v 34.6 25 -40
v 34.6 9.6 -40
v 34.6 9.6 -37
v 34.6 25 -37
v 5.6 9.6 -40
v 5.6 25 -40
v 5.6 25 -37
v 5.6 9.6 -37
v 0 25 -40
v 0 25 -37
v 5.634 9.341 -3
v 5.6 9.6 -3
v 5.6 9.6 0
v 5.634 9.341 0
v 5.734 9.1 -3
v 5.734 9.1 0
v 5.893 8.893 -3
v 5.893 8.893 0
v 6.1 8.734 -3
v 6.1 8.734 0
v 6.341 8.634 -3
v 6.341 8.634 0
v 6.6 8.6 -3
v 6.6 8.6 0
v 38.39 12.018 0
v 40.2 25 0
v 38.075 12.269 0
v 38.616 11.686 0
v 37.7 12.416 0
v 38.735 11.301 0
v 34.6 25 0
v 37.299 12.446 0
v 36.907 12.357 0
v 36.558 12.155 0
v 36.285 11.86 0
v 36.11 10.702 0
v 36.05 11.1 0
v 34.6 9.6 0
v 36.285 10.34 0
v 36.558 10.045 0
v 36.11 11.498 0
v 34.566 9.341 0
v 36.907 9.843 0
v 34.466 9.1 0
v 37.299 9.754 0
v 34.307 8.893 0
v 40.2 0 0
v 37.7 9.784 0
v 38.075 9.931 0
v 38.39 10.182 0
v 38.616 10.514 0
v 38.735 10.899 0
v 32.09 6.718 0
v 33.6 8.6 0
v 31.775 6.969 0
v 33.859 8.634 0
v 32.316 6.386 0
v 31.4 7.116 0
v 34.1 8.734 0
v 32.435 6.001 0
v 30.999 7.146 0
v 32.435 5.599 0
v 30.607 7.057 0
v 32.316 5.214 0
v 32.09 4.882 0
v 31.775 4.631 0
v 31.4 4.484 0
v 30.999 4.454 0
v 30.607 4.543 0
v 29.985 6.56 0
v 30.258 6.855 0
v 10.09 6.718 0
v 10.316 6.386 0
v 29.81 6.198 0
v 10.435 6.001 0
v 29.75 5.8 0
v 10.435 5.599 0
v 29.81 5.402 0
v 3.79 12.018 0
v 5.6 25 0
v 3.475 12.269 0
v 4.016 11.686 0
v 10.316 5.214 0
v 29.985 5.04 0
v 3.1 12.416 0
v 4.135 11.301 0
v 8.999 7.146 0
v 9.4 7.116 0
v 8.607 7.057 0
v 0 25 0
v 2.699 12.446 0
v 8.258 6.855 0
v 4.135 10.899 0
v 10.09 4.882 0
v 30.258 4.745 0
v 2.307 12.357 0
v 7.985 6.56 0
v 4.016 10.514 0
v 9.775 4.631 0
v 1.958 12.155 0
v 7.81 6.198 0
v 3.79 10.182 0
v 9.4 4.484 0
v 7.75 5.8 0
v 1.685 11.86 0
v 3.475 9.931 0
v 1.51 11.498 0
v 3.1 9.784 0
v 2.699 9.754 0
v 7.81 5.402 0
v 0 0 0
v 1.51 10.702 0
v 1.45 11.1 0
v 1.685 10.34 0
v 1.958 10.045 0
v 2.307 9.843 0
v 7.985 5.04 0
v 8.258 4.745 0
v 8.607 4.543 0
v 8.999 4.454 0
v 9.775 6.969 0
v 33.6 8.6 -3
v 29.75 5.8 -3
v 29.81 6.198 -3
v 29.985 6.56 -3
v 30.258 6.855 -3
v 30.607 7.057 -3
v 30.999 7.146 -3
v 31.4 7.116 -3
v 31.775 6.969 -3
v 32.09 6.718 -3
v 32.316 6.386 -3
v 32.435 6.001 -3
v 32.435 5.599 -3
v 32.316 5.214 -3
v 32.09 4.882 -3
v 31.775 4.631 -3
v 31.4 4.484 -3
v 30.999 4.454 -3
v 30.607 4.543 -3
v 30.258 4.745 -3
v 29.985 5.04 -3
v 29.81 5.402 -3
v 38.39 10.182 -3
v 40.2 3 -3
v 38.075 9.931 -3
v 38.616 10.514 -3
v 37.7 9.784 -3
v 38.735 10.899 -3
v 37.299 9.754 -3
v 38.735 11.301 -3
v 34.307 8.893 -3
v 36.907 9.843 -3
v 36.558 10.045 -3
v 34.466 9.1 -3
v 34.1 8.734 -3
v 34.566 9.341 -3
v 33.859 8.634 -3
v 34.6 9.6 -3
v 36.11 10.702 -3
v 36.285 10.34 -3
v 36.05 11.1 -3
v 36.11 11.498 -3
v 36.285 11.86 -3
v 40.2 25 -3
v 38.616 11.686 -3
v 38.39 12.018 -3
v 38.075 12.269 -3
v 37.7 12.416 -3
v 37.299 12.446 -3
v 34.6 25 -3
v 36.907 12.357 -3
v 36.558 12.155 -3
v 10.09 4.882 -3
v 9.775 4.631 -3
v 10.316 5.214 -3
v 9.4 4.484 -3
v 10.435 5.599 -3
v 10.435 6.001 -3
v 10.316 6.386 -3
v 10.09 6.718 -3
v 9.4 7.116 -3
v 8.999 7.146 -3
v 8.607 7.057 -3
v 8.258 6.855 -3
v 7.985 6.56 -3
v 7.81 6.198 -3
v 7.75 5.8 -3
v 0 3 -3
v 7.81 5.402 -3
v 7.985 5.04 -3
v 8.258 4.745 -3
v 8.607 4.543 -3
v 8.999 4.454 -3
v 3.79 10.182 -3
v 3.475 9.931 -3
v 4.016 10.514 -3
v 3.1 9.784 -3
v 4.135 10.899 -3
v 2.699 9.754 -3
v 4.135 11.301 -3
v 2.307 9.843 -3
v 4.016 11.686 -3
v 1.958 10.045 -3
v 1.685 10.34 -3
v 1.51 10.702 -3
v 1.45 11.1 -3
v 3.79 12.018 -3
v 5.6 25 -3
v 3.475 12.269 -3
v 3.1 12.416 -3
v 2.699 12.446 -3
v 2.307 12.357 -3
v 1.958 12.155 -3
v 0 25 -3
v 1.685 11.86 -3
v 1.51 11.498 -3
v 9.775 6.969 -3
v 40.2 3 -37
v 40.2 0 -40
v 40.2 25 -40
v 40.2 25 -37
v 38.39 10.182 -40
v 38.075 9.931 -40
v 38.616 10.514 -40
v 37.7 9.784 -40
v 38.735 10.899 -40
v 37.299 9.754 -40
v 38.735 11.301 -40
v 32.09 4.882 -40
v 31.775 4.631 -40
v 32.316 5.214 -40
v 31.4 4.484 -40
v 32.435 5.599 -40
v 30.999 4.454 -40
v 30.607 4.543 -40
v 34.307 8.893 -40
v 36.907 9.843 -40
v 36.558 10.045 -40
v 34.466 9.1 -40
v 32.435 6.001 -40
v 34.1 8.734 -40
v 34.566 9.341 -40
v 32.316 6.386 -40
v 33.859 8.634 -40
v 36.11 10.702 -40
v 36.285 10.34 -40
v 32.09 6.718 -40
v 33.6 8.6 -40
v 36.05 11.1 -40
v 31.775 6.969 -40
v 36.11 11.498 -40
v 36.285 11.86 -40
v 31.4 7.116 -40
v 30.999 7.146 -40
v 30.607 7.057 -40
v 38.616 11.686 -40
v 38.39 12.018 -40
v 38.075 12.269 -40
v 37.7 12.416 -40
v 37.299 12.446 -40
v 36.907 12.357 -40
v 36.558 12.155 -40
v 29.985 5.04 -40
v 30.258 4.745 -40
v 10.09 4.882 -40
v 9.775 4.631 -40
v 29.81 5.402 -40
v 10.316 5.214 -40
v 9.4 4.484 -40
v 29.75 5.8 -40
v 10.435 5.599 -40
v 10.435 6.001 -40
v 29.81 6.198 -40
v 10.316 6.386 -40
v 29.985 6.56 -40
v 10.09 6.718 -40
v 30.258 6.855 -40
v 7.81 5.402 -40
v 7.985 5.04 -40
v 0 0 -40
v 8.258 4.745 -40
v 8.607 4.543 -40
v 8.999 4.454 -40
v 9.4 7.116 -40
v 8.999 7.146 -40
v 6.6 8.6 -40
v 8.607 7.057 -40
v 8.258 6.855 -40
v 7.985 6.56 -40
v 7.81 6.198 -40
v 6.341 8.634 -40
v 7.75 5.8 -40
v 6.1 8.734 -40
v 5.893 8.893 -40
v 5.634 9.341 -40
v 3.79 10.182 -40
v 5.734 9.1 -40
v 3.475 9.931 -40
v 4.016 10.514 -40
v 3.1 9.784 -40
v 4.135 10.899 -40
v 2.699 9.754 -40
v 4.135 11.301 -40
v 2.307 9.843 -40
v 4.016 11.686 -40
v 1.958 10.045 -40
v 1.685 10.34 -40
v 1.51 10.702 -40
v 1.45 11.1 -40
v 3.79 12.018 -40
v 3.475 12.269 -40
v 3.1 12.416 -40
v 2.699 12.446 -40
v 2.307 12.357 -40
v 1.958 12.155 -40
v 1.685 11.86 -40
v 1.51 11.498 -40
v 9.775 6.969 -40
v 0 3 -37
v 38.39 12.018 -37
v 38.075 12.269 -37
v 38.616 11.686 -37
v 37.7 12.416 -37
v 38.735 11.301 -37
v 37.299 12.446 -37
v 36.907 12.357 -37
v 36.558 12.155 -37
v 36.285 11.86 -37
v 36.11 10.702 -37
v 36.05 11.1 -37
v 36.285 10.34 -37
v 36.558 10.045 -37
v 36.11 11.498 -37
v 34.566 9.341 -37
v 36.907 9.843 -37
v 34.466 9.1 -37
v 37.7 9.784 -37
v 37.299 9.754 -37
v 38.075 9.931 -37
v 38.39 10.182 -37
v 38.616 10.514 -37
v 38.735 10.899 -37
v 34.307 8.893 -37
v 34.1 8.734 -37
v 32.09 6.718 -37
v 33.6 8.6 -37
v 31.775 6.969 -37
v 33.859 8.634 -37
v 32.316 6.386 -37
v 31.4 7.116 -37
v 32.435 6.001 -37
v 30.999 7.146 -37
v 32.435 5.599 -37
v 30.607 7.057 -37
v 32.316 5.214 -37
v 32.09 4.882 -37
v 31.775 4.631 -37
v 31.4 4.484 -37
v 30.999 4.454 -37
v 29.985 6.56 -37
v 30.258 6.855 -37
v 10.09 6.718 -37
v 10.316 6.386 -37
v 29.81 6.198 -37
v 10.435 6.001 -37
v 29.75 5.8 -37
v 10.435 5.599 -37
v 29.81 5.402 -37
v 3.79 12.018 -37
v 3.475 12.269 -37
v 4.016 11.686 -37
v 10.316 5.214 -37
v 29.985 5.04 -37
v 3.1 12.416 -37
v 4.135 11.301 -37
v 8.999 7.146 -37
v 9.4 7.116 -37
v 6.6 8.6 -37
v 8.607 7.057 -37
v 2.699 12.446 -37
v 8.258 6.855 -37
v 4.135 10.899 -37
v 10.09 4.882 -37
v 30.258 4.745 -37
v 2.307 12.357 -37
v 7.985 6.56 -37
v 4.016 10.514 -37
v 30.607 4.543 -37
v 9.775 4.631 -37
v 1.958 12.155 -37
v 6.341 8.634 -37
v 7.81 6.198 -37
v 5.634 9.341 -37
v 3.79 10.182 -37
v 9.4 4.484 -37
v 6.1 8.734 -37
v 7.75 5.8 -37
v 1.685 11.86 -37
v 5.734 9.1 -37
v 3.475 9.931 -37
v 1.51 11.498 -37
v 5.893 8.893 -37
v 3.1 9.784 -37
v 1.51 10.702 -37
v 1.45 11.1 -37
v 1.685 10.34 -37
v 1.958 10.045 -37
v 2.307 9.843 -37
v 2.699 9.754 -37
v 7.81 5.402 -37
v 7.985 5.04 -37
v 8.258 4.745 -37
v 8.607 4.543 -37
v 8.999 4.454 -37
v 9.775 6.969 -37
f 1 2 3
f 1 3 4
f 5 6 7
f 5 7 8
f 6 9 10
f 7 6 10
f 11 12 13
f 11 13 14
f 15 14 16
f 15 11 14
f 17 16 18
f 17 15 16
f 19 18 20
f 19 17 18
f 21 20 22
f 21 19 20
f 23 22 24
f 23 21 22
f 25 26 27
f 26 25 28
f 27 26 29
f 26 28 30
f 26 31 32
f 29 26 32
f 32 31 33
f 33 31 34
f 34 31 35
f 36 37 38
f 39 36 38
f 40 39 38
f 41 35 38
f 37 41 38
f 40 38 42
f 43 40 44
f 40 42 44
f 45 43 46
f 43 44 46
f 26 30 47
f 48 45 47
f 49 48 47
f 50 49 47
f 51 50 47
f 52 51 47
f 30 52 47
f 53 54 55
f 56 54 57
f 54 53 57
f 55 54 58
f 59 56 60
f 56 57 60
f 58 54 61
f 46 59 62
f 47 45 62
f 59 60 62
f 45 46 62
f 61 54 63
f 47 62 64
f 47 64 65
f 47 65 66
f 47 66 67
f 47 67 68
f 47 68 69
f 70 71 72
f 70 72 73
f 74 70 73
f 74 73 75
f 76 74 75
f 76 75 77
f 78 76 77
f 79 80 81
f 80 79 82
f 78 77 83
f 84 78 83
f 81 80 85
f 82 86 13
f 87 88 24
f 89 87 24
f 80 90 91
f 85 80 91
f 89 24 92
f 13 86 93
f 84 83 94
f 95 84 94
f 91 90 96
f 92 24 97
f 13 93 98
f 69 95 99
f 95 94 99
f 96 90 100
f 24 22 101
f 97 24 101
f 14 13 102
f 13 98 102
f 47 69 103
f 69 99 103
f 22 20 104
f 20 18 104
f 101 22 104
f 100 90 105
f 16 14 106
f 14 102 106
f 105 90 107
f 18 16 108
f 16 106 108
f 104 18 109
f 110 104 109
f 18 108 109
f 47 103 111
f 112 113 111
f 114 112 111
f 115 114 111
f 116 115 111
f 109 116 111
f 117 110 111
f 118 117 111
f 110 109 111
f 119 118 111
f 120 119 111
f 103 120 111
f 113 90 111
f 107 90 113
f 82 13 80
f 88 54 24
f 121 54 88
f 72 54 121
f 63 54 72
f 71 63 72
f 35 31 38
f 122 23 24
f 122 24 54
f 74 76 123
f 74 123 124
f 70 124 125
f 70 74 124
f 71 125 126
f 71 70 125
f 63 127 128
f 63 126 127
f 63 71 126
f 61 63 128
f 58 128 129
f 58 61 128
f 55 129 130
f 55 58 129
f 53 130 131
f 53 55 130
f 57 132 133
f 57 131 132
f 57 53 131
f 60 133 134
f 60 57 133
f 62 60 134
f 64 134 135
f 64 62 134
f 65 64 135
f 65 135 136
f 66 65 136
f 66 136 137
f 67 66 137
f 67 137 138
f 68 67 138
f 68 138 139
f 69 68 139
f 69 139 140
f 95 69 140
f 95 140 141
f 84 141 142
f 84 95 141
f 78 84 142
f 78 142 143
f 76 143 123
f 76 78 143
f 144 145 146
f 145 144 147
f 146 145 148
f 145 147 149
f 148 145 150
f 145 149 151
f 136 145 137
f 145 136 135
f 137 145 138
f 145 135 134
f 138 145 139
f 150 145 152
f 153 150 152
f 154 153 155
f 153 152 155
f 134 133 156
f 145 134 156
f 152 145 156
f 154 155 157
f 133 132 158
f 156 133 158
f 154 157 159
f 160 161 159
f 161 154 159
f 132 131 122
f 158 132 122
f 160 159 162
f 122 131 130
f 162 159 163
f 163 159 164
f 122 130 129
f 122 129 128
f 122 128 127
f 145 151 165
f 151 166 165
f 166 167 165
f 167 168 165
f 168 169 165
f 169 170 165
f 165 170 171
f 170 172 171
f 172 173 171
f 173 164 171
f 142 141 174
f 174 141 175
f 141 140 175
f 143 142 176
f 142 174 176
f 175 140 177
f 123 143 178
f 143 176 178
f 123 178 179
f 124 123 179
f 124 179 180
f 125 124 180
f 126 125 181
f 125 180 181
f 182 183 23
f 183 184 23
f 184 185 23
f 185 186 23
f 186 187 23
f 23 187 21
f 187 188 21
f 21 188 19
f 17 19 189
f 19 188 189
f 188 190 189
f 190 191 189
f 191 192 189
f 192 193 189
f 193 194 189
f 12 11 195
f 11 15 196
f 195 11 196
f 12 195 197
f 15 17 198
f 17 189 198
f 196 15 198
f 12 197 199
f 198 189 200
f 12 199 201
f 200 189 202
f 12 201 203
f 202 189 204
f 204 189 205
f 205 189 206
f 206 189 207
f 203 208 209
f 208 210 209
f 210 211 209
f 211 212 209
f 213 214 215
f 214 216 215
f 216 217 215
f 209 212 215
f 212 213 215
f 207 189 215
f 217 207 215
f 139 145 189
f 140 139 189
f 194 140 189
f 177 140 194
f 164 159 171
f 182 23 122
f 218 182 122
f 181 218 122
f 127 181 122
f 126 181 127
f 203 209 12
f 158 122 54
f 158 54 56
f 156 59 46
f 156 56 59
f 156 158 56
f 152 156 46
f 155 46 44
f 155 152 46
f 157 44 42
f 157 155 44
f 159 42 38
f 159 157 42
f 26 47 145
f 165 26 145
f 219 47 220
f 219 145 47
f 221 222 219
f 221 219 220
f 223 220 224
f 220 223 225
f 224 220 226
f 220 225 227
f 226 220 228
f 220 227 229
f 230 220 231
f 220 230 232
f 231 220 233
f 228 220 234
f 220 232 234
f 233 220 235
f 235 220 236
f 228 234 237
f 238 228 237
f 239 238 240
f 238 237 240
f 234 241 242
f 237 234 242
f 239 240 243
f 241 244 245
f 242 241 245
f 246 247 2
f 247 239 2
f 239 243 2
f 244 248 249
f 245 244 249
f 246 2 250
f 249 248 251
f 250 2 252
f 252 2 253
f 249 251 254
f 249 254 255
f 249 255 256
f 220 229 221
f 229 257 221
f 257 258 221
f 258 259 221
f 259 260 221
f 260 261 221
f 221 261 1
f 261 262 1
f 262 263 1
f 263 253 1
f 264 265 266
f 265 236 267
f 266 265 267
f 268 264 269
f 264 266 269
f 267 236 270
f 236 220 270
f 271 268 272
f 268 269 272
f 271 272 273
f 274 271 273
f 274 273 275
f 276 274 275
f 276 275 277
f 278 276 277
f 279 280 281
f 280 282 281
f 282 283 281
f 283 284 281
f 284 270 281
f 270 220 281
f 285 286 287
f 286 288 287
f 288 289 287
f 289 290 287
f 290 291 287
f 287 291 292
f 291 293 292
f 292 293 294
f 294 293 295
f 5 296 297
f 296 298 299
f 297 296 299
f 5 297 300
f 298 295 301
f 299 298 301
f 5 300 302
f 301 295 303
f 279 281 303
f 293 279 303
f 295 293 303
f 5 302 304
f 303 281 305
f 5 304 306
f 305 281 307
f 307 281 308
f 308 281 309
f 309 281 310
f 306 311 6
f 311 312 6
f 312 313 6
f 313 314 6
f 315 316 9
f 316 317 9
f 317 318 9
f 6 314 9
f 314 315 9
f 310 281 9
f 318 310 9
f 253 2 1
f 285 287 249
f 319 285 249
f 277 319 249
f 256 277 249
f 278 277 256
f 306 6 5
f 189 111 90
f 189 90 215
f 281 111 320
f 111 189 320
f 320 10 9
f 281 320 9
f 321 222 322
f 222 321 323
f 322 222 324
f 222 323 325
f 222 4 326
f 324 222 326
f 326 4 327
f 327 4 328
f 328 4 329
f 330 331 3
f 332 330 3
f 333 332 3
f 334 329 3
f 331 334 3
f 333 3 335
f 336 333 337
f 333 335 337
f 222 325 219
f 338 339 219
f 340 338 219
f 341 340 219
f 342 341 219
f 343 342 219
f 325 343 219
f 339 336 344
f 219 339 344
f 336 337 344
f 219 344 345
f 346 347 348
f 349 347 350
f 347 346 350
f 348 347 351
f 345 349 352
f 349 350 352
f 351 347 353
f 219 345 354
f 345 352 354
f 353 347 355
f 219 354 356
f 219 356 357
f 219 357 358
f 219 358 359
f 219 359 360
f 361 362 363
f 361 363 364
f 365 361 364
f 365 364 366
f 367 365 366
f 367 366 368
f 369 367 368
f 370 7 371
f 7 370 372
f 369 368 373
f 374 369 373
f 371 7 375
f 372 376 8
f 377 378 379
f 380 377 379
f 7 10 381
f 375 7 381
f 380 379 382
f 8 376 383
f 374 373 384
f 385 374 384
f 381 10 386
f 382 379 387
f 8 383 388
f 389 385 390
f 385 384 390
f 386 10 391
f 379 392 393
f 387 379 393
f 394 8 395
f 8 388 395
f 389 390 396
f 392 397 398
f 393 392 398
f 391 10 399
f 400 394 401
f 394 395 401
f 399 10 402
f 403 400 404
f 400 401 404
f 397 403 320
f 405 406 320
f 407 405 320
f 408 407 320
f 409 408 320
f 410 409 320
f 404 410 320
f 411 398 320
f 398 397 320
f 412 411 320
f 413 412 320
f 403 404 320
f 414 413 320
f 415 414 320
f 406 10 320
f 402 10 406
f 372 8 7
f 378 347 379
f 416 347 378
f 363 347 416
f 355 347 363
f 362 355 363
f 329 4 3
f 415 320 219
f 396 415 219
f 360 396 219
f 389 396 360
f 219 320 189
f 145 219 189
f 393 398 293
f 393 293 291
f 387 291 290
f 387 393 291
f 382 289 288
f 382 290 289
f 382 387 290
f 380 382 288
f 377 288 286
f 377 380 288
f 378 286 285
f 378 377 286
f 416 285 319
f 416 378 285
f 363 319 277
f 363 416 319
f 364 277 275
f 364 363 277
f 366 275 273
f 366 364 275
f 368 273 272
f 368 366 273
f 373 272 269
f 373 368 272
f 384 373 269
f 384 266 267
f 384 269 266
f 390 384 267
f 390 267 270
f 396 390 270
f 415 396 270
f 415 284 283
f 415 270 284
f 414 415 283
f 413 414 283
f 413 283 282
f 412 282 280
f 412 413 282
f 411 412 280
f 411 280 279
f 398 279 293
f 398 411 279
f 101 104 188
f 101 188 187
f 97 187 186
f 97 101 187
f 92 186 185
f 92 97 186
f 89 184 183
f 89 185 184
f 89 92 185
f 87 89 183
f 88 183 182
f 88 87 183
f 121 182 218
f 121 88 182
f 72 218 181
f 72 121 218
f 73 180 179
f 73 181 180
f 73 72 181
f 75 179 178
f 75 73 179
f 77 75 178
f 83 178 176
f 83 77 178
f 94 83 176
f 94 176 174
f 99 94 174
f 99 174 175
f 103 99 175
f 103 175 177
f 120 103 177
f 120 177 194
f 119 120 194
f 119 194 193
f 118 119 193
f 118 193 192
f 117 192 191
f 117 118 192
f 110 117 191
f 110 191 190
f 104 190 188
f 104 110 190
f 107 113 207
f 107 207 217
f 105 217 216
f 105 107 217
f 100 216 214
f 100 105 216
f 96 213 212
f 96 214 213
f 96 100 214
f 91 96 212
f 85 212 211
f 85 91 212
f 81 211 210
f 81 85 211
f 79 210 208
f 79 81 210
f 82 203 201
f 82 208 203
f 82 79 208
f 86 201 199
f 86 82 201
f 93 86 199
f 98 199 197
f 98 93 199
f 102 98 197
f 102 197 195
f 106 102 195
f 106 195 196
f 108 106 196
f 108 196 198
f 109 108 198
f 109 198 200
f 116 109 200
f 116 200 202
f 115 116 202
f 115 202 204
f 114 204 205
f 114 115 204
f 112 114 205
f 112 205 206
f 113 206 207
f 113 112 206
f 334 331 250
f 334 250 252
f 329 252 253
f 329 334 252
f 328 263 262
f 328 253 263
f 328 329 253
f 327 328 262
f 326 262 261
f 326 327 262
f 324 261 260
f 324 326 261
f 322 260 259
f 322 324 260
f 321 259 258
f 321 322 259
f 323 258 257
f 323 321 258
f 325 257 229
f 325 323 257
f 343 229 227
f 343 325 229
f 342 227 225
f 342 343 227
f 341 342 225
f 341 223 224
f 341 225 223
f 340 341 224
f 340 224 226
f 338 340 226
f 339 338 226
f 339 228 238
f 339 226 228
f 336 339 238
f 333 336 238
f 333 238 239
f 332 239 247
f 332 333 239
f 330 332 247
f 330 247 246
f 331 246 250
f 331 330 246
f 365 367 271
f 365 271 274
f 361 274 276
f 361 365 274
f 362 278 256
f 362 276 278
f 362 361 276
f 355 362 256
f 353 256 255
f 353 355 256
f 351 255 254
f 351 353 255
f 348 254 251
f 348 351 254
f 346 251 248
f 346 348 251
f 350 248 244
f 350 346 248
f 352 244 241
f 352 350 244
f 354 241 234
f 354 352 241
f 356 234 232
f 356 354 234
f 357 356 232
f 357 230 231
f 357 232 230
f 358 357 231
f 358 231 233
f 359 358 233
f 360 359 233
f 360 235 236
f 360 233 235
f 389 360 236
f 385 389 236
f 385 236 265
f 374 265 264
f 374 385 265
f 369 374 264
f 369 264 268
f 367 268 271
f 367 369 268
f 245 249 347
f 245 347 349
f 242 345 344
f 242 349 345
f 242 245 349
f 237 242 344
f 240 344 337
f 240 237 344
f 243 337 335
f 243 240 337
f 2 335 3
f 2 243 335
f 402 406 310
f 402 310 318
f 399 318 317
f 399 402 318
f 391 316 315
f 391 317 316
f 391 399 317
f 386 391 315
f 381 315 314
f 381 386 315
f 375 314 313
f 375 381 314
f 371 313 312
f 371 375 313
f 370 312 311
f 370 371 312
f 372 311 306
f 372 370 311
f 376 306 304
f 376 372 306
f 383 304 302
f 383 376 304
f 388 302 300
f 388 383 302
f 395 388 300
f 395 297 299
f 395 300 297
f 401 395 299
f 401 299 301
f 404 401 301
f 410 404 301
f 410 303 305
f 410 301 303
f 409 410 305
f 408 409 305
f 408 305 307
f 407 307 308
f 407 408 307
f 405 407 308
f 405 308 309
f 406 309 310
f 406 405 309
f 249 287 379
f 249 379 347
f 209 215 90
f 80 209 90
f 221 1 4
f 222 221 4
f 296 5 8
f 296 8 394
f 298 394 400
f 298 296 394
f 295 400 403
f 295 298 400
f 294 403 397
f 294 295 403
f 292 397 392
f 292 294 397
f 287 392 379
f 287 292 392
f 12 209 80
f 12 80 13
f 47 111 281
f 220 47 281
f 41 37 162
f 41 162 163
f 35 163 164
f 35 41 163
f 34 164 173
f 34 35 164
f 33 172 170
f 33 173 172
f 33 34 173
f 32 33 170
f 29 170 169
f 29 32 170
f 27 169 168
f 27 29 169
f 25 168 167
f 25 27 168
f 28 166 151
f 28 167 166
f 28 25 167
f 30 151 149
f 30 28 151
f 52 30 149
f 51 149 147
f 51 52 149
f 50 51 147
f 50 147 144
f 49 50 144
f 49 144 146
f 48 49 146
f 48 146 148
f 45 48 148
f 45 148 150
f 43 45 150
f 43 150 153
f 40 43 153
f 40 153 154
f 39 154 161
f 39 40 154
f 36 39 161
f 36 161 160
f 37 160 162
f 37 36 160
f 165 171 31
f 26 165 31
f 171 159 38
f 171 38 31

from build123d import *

# Parameters (mm, degrees)
BOSS_EXTRUDE1_DEPTH     = 40.2
CUT_EXTRUDE1_DEPTH      = 62.976124435
CUT_EXTRUDE1_DEPTH_BACK = 62.976124435
CUT_EXTRUDE2_DEPTH      = 61.083608414
CUT_EXTRUDE2_DEPTH_BACK = 61.083608414
SKETCH3_R               = 1.35


with BuildPart() as part:
    # Sketch1 → Boss-Extrude1 (new body)
    with BuildSketch(Plane(origin=(0, 0, 0), x_dir=(0, 0, -1), z_dir=(1, 0, 0))):
        Polygon((0, 25), (0, 0), (40, 0), (40, 25), (37, 25), (37, 3), (3, 3), (3, 25), align=None)
    extrude(amount=BOSS_EXTRUDE1_DEPTH)

    # Sketch2 → Cut-Extrude1 (cut, two sides: drawn at the far end of the back side and taken through both)
    with BuildSketch(Plane.XY.offset(-CUT_EXTRUDE1_DEPTH_BACK)):
        with BuildLine():
            Line((20.1, 8.6), (20.1, 25))
            Line((20.1, 25), (5.6, 25))
            Line((5.6, 25), (5.6, 9.6))
            ThreePointArc((5.6, 9.6), (5.892893219, 8.892893219), (6.6, 8.6))
            Line((6.6, 8.6), (20.1, 8.6))
        make_face()
        with BuildLine():
            Line((34.6, 25), (20.1, 25))
            Line((20.1, 25), (20.1, 8.6))
            Line((20.1, 8.6), (33.6, 8.6))
            ThreePointArc((33.6, 8.6), (34.307106781, 8.892893219), (34.6, 9.6))
            Line((34.6, 9.6), (34.6, 25))
        make_face()
    extrude(amount=CUT_EXTRUDE1_DEPTH + CUT_EXTRUDE1_DEPTH_BACK, mode=Mode.SUBTRACT)

    # Sketch3 → Cut-Extrude2 (cut, two sides: drawn at the far end of the back side and taken through both)
    with BuildSketch(Plane(origin=(0, 0, -3), x_dir=(-1, 0, 0), z_dir=(0, 0, -1)).offset(-CUT_EXTRUDE2_DEPTH_BACK)):
        with Locations((-9.1, 5.8)):
            Circle(SKETCH3_R)
        with Locations((-2.8, 11.1)):
            Circle(SKETCH3_R)
        with Locations((-37.4, 11.1)):
            Circle(SKETCH3_R)
        with Locations((-31.1, 5.8)):
            Circle(SKETCH3_R)
    extrude(amount=CUT_EXTRUDE2_DEPTH + CUT_EXTRUDE2_DEPTH_BACK, mode=Mode.SUBTRACT)


solid = part.part
